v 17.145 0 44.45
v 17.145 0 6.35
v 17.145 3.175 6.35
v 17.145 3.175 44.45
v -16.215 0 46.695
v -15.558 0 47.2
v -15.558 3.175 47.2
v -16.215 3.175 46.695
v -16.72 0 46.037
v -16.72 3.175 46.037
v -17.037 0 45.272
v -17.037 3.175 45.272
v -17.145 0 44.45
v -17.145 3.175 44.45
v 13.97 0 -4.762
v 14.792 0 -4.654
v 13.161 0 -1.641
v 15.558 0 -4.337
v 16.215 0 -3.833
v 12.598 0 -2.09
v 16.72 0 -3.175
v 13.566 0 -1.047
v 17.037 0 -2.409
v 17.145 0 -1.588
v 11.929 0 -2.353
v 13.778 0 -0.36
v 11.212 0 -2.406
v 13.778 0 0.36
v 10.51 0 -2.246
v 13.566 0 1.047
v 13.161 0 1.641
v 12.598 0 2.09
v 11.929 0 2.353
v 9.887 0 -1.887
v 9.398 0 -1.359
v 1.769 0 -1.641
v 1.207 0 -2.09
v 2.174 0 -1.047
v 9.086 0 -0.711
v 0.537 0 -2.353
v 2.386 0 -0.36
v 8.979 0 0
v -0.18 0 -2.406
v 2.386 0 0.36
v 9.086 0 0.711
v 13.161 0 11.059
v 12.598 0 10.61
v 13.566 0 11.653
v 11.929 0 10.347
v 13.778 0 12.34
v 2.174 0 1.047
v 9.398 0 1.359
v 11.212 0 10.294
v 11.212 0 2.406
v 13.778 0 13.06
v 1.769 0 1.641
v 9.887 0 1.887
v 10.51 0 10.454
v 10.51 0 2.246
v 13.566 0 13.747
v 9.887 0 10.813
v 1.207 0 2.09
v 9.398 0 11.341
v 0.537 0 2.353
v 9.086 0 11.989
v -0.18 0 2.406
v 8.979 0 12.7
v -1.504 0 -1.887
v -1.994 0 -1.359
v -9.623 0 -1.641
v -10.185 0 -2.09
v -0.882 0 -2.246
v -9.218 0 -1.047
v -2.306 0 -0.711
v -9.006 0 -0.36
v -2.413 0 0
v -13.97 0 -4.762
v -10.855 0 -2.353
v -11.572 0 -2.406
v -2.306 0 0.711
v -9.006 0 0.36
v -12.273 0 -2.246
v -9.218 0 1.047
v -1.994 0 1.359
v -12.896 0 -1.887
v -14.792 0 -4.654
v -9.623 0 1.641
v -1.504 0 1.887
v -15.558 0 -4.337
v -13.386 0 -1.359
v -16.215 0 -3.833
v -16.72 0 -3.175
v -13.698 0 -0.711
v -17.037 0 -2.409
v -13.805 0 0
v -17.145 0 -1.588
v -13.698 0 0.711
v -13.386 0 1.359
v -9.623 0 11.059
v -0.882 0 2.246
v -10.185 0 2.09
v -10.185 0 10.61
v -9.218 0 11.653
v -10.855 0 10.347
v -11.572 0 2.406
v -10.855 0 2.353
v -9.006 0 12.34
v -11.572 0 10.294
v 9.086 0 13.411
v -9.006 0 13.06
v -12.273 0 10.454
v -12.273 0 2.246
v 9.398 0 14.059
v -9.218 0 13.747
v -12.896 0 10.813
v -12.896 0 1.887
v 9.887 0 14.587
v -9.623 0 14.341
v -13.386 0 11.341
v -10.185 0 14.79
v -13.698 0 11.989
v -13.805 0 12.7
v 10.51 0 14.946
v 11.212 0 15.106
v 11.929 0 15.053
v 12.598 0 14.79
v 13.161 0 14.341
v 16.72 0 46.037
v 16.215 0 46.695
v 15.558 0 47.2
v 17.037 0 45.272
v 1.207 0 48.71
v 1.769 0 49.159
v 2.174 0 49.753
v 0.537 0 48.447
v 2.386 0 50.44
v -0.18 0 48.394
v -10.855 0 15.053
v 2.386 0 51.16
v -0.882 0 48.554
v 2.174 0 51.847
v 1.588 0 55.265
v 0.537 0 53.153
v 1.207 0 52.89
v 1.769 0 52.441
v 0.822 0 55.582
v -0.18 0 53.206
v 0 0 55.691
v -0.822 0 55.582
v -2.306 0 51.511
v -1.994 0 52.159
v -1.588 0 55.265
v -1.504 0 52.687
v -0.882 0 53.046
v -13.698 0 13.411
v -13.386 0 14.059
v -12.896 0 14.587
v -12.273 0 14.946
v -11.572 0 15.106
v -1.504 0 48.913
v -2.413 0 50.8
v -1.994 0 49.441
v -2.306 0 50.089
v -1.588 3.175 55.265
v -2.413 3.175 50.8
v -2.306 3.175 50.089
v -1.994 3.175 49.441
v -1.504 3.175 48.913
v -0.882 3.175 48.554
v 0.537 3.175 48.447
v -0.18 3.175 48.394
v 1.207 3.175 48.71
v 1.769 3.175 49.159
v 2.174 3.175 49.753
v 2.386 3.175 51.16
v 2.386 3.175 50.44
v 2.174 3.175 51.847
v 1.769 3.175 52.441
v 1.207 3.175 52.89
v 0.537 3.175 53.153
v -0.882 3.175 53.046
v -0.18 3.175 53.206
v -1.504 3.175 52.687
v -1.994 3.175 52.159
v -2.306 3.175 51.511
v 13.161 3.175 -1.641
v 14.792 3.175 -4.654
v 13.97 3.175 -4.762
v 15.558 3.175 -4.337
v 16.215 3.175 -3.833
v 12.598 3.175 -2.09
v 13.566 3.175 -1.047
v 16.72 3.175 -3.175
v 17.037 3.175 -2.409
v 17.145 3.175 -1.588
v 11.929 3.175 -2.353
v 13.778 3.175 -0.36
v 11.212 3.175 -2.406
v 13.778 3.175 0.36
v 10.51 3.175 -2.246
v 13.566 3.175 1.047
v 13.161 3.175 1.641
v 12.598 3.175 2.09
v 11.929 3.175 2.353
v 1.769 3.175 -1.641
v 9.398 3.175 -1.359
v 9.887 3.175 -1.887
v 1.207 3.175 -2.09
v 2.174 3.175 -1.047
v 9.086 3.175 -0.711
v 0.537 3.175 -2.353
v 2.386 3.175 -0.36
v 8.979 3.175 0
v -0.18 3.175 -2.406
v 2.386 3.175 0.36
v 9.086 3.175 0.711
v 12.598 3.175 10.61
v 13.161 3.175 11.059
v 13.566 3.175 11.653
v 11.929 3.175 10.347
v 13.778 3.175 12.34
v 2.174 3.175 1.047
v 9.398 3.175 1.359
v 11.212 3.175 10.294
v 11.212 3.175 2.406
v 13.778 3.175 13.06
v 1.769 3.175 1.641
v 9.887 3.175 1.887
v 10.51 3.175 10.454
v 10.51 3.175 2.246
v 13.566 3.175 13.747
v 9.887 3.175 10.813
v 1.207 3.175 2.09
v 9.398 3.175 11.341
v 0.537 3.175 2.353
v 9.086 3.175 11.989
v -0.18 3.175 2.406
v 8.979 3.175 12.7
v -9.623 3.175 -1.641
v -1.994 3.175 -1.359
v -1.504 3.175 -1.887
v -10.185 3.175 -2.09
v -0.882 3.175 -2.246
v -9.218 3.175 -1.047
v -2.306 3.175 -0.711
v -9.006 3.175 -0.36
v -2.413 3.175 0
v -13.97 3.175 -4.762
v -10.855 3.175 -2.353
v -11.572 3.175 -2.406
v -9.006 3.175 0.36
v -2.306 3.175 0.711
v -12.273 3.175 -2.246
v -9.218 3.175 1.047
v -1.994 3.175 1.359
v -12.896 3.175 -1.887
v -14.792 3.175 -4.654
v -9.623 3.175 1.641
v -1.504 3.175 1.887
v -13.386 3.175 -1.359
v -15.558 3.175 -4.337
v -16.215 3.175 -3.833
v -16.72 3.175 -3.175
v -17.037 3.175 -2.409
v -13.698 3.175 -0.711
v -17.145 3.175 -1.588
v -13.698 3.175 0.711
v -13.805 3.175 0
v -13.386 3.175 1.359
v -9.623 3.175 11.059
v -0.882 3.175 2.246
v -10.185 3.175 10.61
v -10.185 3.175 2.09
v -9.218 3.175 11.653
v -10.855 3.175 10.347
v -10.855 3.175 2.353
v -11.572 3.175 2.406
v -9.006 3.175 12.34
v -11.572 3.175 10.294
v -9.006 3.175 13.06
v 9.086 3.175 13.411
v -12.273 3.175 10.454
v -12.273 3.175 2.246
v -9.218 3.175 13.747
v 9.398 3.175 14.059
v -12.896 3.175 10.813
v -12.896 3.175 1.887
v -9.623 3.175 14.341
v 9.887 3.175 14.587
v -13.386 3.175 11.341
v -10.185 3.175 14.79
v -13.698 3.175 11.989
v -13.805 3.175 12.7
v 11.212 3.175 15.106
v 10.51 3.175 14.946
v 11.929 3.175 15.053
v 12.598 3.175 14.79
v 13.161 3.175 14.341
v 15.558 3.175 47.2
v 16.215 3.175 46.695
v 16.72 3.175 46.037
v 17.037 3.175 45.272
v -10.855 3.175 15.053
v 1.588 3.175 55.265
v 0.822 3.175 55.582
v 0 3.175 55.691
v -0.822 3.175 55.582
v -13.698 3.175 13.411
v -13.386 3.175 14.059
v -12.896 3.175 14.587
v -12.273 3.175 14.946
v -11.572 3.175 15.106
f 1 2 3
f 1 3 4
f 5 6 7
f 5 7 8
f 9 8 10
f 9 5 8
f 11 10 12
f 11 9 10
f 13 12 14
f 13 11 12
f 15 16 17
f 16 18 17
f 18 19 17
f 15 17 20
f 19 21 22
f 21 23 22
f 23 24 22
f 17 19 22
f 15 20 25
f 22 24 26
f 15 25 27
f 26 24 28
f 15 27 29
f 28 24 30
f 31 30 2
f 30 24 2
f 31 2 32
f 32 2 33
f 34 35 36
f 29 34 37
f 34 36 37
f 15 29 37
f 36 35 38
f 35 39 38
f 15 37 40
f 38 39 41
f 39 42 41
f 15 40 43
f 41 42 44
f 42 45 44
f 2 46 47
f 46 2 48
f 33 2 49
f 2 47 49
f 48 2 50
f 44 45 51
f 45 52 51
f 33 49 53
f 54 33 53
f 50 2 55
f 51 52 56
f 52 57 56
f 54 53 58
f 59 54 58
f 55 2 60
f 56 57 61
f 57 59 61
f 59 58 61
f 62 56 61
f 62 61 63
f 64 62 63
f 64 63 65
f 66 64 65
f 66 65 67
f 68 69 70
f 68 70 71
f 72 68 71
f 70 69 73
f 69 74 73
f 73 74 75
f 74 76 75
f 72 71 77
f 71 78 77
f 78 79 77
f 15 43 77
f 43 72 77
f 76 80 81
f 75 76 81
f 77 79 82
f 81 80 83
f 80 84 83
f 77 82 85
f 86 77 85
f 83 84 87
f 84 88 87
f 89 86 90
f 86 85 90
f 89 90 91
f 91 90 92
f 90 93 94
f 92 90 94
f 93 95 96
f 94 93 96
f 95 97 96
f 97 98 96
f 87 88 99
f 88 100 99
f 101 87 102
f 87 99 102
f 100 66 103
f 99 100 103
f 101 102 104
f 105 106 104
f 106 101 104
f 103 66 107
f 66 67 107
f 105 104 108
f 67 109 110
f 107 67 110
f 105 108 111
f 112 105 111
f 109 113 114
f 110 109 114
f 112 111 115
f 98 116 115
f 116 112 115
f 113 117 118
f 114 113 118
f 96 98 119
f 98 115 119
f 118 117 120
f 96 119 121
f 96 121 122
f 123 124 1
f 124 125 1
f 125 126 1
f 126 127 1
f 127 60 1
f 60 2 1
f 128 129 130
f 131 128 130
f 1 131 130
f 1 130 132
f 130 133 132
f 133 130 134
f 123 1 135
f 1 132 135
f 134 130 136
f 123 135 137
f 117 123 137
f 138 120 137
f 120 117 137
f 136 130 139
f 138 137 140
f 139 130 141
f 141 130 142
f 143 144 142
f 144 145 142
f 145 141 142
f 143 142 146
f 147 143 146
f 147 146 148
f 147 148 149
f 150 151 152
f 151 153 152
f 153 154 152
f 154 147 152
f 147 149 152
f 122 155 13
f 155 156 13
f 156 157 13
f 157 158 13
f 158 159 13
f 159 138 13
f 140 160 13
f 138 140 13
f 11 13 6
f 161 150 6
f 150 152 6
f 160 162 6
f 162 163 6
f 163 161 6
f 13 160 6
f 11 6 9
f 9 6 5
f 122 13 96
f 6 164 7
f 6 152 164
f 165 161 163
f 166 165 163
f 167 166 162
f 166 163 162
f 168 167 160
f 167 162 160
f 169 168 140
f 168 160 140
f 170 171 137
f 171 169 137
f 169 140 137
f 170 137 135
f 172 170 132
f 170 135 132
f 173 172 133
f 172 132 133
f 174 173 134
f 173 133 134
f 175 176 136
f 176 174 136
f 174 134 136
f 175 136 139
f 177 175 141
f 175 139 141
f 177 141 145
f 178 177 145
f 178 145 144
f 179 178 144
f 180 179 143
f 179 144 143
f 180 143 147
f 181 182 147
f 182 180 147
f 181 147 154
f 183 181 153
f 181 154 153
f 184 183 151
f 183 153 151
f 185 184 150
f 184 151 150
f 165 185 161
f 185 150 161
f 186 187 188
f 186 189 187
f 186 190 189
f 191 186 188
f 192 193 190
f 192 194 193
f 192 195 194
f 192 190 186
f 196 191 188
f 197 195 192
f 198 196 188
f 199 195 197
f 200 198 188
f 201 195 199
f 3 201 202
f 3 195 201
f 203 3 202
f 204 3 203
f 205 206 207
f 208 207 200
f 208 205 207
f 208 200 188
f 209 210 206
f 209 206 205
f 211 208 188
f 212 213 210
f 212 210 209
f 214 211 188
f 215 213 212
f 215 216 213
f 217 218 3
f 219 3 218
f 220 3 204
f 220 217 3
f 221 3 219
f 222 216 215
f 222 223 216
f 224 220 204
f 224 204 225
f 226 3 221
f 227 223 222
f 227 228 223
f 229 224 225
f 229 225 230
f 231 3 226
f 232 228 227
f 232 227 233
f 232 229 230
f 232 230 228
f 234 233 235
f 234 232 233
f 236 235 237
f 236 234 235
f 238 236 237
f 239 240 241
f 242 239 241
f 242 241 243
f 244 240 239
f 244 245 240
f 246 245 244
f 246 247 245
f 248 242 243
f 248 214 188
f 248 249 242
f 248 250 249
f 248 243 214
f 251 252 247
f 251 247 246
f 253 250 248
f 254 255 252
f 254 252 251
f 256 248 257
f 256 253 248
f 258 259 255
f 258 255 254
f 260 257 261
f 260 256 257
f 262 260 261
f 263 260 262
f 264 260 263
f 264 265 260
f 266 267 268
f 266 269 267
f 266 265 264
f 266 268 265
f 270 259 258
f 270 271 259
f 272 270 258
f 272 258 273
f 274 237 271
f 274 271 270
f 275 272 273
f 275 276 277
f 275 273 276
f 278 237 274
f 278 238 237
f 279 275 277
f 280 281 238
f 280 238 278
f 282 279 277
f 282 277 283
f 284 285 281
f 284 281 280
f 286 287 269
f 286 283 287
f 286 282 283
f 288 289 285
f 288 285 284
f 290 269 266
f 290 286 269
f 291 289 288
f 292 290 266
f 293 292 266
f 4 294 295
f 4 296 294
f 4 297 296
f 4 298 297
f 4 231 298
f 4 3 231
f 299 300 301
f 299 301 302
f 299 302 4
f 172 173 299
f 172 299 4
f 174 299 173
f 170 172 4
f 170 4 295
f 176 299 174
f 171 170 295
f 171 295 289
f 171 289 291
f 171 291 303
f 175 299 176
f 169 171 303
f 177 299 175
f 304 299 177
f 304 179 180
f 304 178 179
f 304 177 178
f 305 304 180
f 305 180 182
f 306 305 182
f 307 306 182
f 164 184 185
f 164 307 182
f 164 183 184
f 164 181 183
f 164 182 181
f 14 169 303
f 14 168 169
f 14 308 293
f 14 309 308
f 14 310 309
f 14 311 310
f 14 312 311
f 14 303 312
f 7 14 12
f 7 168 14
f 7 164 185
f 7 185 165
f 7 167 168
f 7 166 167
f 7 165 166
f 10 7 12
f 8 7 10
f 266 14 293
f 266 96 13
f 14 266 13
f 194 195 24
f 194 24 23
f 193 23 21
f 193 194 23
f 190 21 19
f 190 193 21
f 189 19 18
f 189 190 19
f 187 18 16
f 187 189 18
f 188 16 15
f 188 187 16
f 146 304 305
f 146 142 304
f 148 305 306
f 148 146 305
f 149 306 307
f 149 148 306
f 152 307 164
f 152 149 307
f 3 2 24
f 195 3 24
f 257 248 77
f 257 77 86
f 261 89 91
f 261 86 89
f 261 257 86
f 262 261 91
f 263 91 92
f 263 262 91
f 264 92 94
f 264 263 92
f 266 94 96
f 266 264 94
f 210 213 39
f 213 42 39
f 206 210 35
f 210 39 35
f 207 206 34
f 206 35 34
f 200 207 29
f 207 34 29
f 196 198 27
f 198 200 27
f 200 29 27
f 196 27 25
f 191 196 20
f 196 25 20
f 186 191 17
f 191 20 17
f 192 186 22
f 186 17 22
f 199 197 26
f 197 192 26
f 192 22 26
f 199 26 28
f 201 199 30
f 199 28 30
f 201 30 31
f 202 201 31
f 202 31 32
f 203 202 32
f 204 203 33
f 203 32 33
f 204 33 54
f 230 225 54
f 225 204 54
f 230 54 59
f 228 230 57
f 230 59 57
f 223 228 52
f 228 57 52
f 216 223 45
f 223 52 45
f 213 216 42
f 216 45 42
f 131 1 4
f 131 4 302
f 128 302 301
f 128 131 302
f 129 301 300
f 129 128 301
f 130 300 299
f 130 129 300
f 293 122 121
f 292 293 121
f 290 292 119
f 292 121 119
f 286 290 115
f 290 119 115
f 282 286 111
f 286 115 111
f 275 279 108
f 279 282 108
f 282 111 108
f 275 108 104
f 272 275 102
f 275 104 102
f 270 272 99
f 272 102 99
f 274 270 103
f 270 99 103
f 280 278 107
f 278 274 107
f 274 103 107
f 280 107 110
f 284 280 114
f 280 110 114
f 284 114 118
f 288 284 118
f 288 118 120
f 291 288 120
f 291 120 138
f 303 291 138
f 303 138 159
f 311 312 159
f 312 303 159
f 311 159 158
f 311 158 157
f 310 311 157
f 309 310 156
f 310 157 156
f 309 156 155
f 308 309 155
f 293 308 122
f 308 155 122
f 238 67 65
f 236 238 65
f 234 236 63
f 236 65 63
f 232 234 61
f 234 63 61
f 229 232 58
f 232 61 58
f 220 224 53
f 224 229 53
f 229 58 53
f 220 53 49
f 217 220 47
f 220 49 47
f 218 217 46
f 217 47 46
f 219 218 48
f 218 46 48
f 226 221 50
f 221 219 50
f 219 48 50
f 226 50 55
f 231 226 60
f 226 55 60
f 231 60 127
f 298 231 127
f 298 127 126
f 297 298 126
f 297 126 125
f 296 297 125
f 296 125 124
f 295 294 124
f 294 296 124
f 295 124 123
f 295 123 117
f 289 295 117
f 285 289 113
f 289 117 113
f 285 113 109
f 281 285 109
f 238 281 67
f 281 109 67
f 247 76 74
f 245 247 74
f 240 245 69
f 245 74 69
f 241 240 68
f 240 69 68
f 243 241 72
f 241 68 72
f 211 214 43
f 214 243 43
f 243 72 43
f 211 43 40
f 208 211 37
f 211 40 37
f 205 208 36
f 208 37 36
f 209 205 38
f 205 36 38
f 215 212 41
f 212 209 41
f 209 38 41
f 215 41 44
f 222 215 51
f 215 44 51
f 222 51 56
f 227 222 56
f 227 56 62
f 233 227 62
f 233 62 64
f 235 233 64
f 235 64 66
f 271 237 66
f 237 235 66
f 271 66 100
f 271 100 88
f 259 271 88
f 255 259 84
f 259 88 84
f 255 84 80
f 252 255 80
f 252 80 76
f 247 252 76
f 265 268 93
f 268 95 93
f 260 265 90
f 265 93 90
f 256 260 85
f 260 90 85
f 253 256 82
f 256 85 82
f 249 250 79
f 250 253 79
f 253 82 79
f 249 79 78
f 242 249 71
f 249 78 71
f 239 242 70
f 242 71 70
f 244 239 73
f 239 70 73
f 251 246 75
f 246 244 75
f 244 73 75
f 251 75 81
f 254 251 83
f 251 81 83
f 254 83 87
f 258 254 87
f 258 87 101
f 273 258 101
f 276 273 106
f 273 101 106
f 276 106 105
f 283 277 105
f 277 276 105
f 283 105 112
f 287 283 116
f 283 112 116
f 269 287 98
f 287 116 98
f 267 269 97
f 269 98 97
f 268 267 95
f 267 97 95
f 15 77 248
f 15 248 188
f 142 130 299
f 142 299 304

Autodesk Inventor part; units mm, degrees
ref_plane "YZ Plane" through (0, 0, 0) normal (1, 0, 0) x (0, 1, 0)
ref_plane "XZ Plane" through (0, 0, 0) normal (0, 1, 0) x (-1, 0, 0)
ref_plane "XY Plane" through (0, 0, 0) normal (0, 0, 1) x (1, 0, 0)
sketch "Sketch1" plane through (0, 0, 0) normal (0, 1, 0) x (-1, 0, 0)
  circle A0 centre (0, 0) radius 2.413
  circle A1 centre (0, 50.8) radius 2.413
  line L0 (0, 50.8) -> (0, 0) construction
  circle A2 centre (11.3919, 12.7) radius 2.413
  circle A3 centre (11.3919, 0) radius 2.413
  circle A4 centre (-11.3919, 0) radius 2.413
  circle A5 centre (-11.3919, 12.7) radius 2.413
  line L1 (-11.3919, 0) -> (-11.3919, 12.7) construction
  line L2 (-11.3919, 12.7) -> (11.3919, 12.7) construction
  line L3 (1.5875, 55.2652) -> (15.5575, 47.1996)
  line L4 (-15.5575, 47.1996) -> (-1.5875, 55.2652)
  arc A6 (1.5875, 55.2652) -> (-1.5875, 55.2652) centre (0, 52.5156) ccw
  arc A7 (-15.5575, 47.1996) -> (-17.145, 44.45) centre (-13.97, 44.45) ccw
  arc A8 (17.145, 44.45) -> (15.5575, 47.1996) centre (13.97, 44.45) ccw
  line L5 (-17.145, 6.35) -> (-17.145, 44.45)
  line L6 (17.145, -4.7625) -> (17.145, 44.45)
  line L7 (17.145, -4.7625) -> (-17.145, -4.7625)
  line L8 (-17.145, 6.35) -> (-17.145, -4.7625)
  line L9 (13.97, 44.45) -> (-13.97, 44.45) construction
  point P0 (0, 25.4)
  point P1 (0, 56.1818)
  point P2 (26.6578, 40.7909)
  point P3 (26.6578, 10.0091)
  point P4 (-26.6578, 10.0091)
  point P5 (-26.6578, 40.7909)
  dimension "d1" = 4.826
  dimension "d2" = 50.8
  dimension "d3" = 4.826
  dimension "d4" = 4.826
  dimension "d5" = 12.7
  dimension "d6" = 11.3919
  dimension "d7" = 11.3919
  dimension "d8" = 0
  dimension "d9" = 4.826
  dimension "d10" = 4.826
  dimension "d11" = 11.3919
  dimension "d12" = 12.7
  dimension "d14" = 3.175
  dimension "d17" = 38.1
  dimension "d18" = 34.29
  dimension "d19" = 4.7625
  dimension "d20" = 6.35
  dimension "d21" = 49.2125
  dimension "d22" = 8.0656
extrude "Extrusion1" add sketch "Sketch1" along normal blind 3.175
fillet "Fillet1" radius 3.175 2 edges at (-17.145, 1.5875, -4.7625) (17.145, 1.5875, -4.7625)
equation "\"d7\" = d6"
equation "\"d11\" = d6"
equation "\"d21\" = d20 + d19 + d17"
properties part number "Roller Pneumatic Back Connector (Custom)" material "Aluminum 6061"
